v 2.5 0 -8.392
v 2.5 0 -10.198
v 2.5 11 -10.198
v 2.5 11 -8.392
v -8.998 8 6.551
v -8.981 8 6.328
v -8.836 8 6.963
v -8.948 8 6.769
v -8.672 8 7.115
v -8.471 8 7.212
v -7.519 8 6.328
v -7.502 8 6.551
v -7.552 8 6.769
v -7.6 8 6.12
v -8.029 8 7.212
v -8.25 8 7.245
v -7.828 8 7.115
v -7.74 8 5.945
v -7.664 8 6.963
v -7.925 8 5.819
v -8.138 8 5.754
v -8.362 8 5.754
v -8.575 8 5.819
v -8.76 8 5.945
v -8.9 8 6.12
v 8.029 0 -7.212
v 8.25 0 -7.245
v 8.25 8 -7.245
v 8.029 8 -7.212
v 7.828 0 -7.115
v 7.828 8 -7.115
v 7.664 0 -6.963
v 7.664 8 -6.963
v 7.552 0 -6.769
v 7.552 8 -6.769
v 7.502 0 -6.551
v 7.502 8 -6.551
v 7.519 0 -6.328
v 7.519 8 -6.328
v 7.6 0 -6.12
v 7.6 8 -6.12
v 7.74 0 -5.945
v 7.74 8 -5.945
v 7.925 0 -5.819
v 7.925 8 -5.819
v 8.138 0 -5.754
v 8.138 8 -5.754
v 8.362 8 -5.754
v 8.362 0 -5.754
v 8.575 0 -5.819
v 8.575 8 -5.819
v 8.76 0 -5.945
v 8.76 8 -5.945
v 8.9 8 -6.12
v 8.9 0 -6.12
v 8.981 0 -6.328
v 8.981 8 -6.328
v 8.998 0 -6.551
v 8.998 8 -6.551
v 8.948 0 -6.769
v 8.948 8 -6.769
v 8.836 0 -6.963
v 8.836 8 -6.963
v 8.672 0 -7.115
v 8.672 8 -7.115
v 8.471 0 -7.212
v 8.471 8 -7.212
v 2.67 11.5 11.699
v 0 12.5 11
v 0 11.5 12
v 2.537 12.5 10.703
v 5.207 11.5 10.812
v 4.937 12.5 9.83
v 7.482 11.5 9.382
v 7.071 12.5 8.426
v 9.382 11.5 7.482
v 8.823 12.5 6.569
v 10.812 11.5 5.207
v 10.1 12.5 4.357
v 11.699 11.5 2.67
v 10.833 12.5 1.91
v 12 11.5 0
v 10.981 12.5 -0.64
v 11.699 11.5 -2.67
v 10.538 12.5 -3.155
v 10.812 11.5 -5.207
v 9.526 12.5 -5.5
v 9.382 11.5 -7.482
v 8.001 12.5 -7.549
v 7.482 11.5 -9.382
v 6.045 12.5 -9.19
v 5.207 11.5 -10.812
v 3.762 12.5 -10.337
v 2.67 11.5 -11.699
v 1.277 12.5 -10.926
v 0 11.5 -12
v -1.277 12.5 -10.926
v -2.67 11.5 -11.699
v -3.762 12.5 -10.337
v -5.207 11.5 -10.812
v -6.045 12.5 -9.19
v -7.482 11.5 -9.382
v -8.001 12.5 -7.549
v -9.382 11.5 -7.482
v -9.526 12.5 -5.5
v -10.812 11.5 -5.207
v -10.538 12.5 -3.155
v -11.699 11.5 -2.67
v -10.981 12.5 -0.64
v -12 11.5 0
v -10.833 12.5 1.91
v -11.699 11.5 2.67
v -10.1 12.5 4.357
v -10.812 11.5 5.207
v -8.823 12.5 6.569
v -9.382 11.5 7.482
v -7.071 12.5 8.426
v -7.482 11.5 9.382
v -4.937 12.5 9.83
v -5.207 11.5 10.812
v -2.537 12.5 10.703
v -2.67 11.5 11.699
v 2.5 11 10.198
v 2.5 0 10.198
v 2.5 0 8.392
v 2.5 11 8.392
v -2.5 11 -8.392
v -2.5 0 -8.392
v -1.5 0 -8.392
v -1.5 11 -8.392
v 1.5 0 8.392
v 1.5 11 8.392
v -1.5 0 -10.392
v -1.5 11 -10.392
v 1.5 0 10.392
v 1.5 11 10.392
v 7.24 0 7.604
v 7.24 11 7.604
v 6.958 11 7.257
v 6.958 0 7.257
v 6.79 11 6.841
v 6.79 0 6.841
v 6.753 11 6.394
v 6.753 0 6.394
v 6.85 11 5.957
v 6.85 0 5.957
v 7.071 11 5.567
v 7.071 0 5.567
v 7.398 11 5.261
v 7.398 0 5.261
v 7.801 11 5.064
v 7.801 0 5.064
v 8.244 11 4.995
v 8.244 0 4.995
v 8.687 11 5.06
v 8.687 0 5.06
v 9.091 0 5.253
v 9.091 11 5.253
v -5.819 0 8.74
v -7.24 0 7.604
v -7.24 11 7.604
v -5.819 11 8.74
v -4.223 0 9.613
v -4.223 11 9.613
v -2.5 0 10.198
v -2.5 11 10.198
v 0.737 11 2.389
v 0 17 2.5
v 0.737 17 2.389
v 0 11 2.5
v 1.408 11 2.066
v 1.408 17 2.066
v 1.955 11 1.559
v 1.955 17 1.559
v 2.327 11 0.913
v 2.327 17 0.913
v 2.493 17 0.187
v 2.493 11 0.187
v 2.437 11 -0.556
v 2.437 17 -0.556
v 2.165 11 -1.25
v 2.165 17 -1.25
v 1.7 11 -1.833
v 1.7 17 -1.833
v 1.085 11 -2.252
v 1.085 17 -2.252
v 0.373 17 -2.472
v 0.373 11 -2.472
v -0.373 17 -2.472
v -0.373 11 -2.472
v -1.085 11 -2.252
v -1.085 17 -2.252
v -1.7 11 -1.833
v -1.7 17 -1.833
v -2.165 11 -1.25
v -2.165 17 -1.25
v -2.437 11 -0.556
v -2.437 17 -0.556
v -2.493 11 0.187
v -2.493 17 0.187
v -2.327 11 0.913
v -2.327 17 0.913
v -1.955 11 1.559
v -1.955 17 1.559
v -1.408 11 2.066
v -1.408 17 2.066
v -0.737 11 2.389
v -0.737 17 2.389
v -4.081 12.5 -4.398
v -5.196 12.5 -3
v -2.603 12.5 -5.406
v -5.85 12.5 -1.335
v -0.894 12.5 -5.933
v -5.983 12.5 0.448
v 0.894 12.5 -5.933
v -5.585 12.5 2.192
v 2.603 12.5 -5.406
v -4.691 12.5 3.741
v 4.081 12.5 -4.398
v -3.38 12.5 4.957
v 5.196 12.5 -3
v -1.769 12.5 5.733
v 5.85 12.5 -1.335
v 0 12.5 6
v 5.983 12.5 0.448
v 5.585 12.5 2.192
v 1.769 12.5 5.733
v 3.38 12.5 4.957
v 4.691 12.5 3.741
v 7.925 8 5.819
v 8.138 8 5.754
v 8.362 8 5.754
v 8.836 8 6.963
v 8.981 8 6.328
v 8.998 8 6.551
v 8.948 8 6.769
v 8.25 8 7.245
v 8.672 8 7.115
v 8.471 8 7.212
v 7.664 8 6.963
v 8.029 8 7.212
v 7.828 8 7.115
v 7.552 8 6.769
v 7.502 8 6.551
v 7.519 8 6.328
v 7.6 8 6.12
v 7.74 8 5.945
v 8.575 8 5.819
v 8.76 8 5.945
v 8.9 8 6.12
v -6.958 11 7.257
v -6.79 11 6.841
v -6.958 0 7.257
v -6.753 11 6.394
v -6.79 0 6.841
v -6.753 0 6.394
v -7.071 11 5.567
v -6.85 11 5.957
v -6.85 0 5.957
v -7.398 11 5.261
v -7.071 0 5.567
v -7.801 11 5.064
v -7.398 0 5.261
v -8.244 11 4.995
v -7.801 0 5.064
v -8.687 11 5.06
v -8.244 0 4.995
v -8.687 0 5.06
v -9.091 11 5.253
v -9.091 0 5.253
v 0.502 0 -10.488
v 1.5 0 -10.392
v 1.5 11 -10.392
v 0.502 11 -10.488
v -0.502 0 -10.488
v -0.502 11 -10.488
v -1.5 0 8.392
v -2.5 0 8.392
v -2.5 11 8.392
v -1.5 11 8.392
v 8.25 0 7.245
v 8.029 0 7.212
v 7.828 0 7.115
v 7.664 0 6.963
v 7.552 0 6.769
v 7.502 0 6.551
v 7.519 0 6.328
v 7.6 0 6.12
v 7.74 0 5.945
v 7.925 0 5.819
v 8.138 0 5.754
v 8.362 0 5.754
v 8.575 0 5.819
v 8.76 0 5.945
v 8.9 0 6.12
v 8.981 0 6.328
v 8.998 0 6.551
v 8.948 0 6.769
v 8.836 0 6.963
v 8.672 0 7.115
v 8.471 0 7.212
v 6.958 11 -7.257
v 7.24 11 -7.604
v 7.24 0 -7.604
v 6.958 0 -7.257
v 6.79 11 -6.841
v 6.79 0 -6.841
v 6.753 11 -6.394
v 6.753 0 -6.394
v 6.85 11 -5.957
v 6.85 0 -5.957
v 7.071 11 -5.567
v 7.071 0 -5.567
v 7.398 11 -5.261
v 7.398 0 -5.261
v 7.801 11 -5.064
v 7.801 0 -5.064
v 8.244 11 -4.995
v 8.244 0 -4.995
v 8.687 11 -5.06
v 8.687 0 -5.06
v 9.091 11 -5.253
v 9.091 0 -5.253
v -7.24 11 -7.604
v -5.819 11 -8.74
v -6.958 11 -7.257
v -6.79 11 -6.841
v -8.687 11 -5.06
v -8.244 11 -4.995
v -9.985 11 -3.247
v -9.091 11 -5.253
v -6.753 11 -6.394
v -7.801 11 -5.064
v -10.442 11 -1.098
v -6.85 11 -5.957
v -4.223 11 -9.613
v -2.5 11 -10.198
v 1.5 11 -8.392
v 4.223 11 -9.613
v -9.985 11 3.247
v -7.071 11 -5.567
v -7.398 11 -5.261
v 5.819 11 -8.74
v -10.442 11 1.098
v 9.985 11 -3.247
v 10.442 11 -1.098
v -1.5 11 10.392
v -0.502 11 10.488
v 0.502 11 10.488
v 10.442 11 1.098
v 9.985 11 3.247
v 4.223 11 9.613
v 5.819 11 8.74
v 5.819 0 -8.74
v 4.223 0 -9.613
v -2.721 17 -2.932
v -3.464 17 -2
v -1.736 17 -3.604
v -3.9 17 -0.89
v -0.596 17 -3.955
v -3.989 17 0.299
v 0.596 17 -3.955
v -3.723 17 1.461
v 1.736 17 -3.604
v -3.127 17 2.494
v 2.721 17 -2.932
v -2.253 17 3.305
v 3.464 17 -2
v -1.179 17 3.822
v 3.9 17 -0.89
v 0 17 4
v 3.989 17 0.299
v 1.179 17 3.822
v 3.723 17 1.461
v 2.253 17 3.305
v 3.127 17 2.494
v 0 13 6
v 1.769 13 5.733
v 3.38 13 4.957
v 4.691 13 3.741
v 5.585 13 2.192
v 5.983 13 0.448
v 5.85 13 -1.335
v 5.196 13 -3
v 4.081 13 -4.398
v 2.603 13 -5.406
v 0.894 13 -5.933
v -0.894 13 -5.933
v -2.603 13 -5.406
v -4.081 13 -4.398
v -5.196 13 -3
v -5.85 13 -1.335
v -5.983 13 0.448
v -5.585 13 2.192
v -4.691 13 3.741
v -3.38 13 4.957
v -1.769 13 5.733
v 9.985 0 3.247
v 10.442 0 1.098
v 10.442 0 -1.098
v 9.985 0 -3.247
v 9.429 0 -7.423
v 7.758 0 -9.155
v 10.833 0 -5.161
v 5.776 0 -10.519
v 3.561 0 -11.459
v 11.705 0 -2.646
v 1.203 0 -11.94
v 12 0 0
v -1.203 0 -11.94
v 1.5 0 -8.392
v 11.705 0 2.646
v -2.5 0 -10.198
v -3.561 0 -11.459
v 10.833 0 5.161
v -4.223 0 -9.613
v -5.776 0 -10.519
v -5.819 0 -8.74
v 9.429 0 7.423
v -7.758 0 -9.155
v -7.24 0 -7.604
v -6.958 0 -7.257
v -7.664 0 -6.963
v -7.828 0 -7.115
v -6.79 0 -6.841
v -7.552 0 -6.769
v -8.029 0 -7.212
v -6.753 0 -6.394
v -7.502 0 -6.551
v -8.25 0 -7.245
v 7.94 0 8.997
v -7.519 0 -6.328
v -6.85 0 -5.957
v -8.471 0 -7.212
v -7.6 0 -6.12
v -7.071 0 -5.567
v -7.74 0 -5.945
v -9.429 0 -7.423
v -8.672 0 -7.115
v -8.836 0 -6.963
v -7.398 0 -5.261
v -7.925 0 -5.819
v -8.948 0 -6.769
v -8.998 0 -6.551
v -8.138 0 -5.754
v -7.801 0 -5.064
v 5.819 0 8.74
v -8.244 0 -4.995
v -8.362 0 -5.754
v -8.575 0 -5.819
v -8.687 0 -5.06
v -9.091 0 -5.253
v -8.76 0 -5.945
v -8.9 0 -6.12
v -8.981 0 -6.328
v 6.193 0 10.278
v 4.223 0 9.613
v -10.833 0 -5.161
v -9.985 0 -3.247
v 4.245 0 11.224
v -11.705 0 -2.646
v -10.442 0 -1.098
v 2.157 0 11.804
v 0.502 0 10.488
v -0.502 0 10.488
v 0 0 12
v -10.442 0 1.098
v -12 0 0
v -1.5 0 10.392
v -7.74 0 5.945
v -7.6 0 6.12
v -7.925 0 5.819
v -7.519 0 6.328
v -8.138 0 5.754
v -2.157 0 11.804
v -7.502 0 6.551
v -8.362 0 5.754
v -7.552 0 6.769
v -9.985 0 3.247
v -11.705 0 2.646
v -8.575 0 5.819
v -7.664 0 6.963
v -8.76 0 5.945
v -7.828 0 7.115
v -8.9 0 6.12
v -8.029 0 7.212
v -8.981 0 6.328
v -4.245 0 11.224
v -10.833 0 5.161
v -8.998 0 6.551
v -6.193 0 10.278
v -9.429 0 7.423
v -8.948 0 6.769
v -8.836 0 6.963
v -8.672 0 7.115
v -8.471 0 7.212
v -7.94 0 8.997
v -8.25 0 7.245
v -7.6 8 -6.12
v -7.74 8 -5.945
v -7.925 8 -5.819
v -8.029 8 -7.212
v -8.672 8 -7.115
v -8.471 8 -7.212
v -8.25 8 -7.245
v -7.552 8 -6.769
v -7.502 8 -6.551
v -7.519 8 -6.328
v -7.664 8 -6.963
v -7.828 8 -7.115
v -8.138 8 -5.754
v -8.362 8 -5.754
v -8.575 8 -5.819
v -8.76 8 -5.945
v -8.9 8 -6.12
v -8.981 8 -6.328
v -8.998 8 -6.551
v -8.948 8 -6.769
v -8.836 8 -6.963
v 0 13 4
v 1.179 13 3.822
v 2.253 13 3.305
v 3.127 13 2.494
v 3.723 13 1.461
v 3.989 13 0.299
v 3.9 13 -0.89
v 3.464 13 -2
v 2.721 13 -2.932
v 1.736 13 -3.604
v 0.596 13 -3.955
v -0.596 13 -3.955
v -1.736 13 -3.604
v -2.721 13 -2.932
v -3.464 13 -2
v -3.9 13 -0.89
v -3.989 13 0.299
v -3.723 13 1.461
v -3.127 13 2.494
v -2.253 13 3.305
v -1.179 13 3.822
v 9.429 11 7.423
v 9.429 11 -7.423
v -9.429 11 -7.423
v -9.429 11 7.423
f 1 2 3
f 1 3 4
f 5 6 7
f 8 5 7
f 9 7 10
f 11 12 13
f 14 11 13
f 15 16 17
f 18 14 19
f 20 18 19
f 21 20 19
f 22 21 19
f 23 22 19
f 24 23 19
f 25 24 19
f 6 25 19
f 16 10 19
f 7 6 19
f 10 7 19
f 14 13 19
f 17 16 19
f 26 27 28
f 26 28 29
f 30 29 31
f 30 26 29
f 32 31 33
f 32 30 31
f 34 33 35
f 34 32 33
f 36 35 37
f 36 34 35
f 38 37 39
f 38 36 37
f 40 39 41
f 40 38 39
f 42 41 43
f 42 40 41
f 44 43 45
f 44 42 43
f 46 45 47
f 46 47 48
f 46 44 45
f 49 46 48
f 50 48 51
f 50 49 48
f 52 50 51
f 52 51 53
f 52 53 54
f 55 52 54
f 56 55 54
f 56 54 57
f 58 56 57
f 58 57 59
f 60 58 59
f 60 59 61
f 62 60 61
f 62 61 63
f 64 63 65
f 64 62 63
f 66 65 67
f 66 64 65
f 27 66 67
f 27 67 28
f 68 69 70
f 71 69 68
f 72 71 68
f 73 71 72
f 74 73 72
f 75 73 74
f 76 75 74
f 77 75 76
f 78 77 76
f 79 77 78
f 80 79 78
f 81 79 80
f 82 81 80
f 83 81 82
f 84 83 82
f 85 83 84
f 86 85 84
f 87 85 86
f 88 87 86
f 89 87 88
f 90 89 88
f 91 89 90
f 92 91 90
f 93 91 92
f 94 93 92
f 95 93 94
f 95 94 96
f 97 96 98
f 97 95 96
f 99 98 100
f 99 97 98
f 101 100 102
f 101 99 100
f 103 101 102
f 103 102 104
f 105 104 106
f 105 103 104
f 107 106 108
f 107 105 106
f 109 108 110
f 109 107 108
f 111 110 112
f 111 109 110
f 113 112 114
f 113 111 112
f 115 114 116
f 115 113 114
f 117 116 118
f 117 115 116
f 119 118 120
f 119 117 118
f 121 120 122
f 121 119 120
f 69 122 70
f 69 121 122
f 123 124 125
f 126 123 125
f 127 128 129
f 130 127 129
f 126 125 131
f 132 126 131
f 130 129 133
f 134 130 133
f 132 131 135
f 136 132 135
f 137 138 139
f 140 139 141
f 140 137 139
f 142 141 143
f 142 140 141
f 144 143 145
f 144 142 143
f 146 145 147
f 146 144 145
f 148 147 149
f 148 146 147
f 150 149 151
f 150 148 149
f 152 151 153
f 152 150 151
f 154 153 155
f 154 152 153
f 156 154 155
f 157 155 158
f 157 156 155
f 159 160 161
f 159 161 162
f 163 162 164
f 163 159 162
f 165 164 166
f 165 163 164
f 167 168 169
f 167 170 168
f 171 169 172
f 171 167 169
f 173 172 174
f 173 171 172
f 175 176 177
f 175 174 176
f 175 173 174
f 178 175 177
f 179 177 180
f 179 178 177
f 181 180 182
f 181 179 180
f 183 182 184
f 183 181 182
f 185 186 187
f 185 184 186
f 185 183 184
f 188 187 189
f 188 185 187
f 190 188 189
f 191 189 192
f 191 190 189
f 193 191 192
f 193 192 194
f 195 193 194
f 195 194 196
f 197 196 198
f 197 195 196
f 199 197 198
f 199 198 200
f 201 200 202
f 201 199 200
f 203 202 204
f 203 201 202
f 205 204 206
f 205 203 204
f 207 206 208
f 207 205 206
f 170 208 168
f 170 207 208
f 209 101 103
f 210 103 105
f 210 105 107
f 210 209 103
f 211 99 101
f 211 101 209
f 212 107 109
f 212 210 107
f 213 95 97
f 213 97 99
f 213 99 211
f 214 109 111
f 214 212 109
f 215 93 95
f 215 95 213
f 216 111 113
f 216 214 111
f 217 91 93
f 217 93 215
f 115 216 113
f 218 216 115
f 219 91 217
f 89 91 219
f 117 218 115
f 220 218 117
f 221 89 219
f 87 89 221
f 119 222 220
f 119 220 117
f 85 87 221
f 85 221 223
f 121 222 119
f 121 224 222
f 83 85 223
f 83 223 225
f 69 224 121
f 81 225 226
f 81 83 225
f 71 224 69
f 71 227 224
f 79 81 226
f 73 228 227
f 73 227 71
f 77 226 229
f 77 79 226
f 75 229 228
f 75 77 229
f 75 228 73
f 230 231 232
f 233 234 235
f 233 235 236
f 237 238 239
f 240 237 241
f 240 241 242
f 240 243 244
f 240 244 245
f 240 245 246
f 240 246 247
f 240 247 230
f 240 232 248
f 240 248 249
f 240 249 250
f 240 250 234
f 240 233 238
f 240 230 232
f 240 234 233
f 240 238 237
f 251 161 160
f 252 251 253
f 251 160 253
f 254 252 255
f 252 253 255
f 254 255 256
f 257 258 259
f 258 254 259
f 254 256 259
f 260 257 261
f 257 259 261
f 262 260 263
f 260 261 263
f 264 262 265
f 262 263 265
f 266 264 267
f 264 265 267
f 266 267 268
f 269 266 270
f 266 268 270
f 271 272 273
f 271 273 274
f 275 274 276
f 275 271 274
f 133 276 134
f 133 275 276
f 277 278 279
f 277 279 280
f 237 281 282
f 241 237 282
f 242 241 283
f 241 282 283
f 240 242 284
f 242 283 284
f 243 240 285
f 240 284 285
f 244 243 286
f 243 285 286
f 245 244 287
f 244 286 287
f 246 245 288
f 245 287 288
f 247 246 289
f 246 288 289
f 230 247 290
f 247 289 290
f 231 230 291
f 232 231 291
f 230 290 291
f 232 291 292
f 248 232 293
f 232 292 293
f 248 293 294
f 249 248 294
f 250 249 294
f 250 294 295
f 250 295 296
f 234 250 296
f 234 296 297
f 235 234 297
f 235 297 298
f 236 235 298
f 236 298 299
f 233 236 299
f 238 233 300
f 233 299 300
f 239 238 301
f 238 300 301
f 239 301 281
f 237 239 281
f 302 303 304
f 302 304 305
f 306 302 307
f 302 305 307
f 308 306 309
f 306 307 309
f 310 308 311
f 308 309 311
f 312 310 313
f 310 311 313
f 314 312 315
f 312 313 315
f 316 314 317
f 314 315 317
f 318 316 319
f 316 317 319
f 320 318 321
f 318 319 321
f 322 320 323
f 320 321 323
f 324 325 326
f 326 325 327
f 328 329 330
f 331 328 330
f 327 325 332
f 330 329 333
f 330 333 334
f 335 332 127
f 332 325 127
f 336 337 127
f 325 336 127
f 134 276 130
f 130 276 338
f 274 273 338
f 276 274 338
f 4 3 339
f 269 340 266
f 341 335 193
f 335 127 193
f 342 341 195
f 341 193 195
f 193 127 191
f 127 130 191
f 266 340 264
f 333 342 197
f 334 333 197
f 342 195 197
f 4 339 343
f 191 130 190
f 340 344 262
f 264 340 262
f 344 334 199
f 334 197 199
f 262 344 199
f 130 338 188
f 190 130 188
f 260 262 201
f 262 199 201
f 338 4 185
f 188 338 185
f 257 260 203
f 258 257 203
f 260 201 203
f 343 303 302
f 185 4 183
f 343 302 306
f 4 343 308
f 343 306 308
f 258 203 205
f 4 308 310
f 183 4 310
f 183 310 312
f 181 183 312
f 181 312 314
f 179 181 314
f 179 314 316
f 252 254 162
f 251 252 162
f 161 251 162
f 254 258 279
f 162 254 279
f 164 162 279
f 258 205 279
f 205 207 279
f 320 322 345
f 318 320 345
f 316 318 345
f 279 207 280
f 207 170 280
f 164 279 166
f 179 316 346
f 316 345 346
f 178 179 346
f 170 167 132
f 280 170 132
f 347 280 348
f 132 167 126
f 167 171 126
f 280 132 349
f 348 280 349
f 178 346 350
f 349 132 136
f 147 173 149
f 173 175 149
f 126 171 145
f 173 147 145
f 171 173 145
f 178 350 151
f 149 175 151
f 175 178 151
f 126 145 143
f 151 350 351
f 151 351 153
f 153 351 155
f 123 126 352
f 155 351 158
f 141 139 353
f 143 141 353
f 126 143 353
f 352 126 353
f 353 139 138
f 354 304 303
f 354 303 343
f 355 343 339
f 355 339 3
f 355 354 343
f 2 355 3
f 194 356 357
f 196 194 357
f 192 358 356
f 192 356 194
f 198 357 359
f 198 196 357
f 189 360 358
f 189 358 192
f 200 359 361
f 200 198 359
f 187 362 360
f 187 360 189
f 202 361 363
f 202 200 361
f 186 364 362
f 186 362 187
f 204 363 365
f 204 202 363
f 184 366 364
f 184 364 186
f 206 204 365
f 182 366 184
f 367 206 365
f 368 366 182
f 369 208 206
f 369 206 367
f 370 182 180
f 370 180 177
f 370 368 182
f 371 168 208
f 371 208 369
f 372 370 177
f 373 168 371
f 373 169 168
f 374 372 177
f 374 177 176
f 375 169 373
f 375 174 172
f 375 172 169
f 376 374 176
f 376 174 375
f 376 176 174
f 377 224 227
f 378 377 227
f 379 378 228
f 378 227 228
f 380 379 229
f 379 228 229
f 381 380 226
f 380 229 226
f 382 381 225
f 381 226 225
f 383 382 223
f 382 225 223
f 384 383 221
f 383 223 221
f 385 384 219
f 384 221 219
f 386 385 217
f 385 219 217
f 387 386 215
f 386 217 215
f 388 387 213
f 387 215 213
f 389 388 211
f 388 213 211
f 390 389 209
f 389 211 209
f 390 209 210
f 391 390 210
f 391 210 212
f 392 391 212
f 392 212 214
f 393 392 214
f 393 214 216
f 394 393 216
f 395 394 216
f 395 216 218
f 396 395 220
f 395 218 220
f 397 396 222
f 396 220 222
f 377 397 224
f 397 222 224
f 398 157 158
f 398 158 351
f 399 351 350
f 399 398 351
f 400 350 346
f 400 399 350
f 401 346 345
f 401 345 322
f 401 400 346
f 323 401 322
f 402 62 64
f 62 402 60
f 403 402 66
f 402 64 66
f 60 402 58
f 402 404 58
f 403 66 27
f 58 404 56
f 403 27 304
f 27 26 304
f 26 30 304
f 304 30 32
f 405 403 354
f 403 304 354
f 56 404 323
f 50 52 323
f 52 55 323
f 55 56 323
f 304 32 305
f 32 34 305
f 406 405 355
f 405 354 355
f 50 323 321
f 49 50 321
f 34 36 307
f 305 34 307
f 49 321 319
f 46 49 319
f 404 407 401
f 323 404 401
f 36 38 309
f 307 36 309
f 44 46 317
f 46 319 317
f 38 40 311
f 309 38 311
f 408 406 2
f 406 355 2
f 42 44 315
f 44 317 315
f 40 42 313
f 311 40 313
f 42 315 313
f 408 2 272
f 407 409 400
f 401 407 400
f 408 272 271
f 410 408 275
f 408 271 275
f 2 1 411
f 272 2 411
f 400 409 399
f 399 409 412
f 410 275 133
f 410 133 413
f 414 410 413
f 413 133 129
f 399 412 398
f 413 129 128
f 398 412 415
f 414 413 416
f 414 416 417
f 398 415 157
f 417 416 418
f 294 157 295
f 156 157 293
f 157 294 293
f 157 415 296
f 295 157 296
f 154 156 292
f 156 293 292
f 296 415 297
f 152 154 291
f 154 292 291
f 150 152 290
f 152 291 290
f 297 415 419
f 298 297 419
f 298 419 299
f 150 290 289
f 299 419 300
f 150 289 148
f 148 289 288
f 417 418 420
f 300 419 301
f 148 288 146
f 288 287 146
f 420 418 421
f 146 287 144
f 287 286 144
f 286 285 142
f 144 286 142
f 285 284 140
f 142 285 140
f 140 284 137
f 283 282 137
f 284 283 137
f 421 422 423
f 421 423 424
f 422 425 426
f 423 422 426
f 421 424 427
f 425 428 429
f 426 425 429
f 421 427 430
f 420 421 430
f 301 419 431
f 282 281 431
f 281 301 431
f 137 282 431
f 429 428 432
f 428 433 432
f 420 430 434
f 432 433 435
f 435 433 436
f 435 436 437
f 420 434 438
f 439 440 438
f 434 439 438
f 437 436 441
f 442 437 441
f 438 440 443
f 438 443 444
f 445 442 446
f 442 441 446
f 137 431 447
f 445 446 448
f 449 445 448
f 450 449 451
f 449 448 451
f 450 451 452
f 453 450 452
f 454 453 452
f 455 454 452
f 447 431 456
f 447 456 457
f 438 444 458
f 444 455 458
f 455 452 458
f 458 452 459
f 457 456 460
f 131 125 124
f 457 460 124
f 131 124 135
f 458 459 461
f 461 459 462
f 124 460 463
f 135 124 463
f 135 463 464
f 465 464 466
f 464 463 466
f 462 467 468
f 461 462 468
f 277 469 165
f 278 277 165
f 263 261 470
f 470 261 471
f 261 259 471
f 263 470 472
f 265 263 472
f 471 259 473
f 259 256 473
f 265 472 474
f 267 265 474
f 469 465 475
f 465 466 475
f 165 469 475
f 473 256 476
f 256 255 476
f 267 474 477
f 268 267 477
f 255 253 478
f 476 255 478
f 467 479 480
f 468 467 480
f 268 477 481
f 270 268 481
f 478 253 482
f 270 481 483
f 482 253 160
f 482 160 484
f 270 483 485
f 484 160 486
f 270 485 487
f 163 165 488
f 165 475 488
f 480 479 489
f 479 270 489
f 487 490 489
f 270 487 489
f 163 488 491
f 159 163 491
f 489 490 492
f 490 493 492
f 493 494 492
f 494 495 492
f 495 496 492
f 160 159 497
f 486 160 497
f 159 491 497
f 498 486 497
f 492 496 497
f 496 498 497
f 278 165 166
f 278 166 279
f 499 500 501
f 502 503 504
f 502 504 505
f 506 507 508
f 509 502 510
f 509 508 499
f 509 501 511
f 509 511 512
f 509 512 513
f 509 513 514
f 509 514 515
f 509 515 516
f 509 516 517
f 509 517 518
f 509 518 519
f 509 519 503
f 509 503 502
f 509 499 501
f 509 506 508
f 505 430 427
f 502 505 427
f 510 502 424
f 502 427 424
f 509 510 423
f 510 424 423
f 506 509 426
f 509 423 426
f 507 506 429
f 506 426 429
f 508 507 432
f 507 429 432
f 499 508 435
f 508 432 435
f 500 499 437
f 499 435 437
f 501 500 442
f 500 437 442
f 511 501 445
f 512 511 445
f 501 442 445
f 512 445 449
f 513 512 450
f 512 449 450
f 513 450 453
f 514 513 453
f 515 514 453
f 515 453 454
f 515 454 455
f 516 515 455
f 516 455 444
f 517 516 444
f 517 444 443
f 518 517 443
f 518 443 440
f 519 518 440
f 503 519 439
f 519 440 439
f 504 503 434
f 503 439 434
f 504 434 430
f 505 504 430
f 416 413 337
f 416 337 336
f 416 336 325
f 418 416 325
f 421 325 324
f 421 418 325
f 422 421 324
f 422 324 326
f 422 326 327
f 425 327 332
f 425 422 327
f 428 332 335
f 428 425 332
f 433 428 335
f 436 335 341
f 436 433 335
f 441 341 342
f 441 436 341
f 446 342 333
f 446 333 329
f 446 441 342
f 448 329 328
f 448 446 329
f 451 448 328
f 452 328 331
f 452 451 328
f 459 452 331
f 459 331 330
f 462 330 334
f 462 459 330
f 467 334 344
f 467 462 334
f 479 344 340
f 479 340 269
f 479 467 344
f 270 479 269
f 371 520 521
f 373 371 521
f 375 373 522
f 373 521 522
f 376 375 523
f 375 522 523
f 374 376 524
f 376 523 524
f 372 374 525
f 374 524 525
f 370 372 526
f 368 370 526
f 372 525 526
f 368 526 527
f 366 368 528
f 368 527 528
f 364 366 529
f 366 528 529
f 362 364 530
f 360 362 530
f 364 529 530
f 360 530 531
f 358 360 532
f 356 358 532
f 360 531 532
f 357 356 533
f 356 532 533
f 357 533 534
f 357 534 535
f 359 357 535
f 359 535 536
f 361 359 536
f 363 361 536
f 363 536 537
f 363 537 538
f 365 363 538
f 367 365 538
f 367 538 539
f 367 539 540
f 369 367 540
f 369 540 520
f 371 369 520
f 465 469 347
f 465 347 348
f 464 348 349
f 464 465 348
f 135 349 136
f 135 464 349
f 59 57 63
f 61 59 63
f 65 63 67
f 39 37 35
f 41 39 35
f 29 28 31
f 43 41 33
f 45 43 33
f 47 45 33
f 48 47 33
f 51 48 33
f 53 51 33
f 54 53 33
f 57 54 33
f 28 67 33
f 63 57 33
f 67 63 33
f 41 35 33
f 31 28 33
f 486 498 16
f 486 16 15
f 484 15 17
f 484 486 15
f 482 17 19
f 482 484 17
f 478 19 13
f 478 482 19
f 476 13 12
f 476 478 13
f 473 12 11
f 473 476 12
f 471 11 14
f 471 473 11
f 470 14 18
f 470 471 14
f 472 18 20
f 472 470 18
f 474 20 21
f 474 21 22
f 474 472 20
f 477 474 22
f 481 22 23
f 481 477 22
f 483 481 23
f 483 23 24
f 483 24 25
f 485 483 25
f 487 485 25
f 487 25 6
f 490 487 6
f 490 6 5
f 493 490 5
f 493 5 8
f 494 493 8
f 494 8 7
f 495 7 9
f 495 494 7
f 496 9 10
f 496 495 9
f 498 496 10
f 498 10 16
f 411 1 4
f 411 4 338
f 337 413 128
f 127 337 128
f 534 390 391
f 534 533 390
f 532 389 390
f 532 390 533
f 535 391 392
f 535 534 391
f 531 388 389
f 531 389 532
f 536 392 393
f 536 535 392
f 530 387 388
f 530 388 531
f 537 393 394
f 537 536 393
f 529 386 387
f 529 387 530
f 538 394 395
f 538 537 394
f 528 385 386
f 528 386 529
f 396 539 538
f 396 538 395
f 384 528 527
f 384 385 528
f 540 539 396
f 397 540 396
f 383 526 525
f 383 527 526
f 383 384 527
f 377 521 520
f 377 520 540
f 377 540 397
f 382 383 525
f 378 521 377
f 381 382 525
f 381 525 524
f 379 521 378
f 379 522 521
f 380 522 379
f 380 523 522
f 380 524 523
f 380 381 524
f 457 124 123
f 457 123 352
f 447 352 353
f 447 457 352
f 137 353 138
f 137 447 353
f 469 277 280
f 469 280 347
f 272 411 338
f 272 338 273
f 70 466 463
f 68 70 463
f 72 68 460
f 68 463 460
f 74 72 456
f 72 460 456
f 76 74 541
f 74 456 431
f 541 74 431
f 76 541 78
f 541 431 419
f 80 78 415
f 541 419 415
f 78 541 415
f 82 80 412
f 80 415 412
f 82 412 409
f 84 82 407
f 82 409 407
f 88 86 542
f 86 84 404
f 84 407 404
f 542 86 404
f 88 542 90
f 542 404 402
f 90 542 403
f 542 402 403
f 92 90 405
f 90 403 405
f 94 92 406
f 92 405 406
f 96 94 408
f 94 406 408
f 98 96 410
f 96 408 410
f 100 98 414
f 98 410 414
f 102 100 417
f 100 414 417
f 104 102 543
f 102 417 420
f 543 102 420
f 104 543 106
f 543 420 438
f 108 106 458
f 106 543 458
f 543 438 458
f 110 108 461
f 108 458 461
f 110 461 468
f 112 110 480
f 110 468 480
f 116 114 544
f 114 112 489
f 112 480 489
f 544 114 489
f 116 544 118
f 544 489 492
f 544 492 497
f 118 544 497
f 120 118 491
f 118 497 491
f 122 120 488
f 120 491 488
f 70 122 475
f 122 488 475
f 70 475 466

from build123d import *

# Parameters (mm, degrees)
SKETCH1_R               = 12
BOSS_EXTRUDE1_DEPTH     = 12.5
SKETCH2_R               = 4
BOSS_EXTRUDE2_DEPTH     = 4.5
SHELL1_T                = -1.5
CHAMFER2_SIZE           = 1
SKETCH3_R               = 6
SKETCH3_R_2             = 4
BOSS_EXTRUDE3_DEPTH     = 0.5
BOSS_EXTRUDE4_DEPTH     = 11
MIRROR2_COPY_1_DEPTH    = 11
SKETCH5_R               = 1.5
BOSS_EXTRUDE5_DEPTH     = 11
MIRROR4_COPY_1_SKETCH_R = 1.5
MIRROR4_COPY_1_DEPTH    = 11
SKETCH6_R               = 0.75
CUT_EXTRUDE1_DEPTH      = 8
MIRROR6_COPY_1_SKETCH_R = 0.75
MIRROR6_COPY_1_DEPTH    = 8


with BuildPart() as part:
    # Sketch1 → Boss-Extrude1 (new body)
    with BuildSketch(Plane(origin=(0, 0, 0), x_dir=(1, 0, 0), z_dir=(0, 1, 0))):
        with Locations(Location((0, 0, 0), (0, 0, 270))):
            Circle(SKETCH1_R)
    extrude(amount=BOSS_EXTRUDE1_DEPTH)

    # Sketch2 → Boss-Extrude2 (add)
    with BuildSketch(Plane(origin=(0, 12.5, 0), x_dir=(1, 0, 0), z_dir=(0, 1, 0))):
        with Locations(Location((0, 0, 0), (0, 0, 270))):
            Circle(SKETCH2_R)
    extrude(amount=BOSS_EXTRUDE2_DEPTH)

    # Shell1
    shell1_openings = [part.faces().sort_by_distance(p)[0] for p in [
        (0, 0, 0),
        (0, 17, 0),
    ]]
    offset(amount=SHELL1_T, openings=shell1_openings, kind=Kind.INTERSECTION)

    # Chamfer2
    chamfer2_edges = [part.edges().sort_by_distance(p)[0] for p in [
        (0, 12.5, -12),
    ]]
    chamfer(chamfer2_edges, length=CHAMFER2_SIZE)

    # Sketch3 → Boss-Extrude3 (add)
    with BuildSketch(Plane(origin=(0, 12.5, 0), x_dir=(1, 0, 0), z_dir=(0, 1, 0))):
        with Locations(Location((0, 0, 0), (0, 0, 270))):
            Circle(SKETCH3_R)
        with Locations(Location((0, 0, 0), (0, 0, 270))):
            Circle(SKETCH3_R_2, mode=Mode.SUBTRACT)
    extrude(amount=BOSS_EXTRUDE3_DEPTH)

    # Sketch4 → Boss-Extrude4 (add)
    with BuildSketch(Plane(origin=(0, 0, 0), x_dir=(1, 0, 0), z_dir=(0, 1, 0))):
        with BuildLine():
            Line((-2.5, -10.198039027), (-2.5, -8.392304845))
            Line((-2.5, -8.392304845), (-1.5, -8.392304845))
            Line((-1.5, -8.392304845), (-1.5, -10.392304845))
            ThreePointArc((-1.5, -10.392304845), (-2.002357311, -10.307306399), (-2.5, -10.198039027))
        make_face()
    boss_extrude4 = extrude(amount=BOSS_EXTRUDE4_DEPTH)

    # Mirror1: Boss-Extrude4 across plane
    add(boss_extrude4.mirror(Plane(origin=(0, 0, 0), x_dir=(0, 0, 1), z_dir=(1, 0, 0))))

    # Mirror2: Boss-Extrude4 across plane
    add(boss_extrude4.mirror(Plane.XY))

    # Mirror2 copy 1 sketch → Mirror2 copy 1 (add)
    with BuildSketch(Plane(origin=(0, 0, 0), x_dir=(-1, 0, 0), z_dir=(0, 1, 0))):
        with BuildLine():
            Line((-2.5, -10.198039027), (-2.5, -8.392304845))
            Line((-2.5, -8.392304845), (-1.5, -8.392304845))
            Line((-1.5, -8.392304845), (-1.5, -10.392304845))
            ThreePointArc((-1.5, -10.392304845), (-2.002357311, -10.307306399), (-2.5, -10.198039027))
        make_face()
    extrude(amount=MIRROR2_COPY_1_DEPTH)

    # Sketch5 → Boss-Extrude5 (add)
    with BuildSketch(Plane(origin=(0, 0, 0), x_dir=(1, 0, 0), z_dir=(0, 1, 0))):
        with Locations((-8.25, -6.495190528)):
            Circle(SKETCH5_R)
    boss_extrude5 = extrude(amount=BOSS_EXTRUDE5_DEPTH)

    # Mirror3: Boss-Extrude5 across plane
    add(boss_extrude5.mirror(Plane(origin=(0, 0, 0), x_dir=(0, 0, 1), z_dir=(1, 0, 0))))

    # Mirror4: Boss-Extrude5 across plane
    add(boss_extrude5.mirror(Plane.XY))

    # Mirror4 copy 1 sketch → Mirror4 copy 1 (add)
    with BuildSketch(Plane(origin=(0, 0, 0), x_dir=(-1, 0, 0), z_dir=(0, 1, 0))):
        with Locations((-8.25, -6.495190528)):
            Circle(MIRROR4_COPY_1_SKETCH_R)
    extrude(amount=MIRROR4_COPY_1_DEPTH)

    # Sketch6 → Cut-Extrude1 (cut)
    with BuildSketch(Plane(origin=(0, 0, 0), x_dir=(1, 0, 0), z_dir=(0, 1, 0))):
        with Locations(Location((-8.25, -6.495190528, 0), (0, 0, 270))):
            Circle(SKETCH6_R)
    cut_extrude1 = extrude(amount=CUT_EXTRUDE1_DEPTH, mode=Mode.SUBTRACT)

    # Mirror5: Cut-Extrude1 across plane
    add(cut_extrude1.mirror(Plane(origin=(0, 0, 0), x_dir=(0, 0, 1), z_dir=(1, 0, 0))), mode=Mode.SUBTRACT)

    # Mirror6: Cut-Extrude1 across plane
    add(cut_extrude1.mirror(Plane.XY), mode=Mode.SUBTRACT)

    # Mirror6 copy 1 sketch → Mirror6 copy 1 (cut)
    with BuildSketch(Plane(origin=(0, 0, 0), x_dir=(-1, 0, 0), z_dir=(0, 1, 0))):
        with Locations(Location((-8.25, -6.495190528, 0), (0, 0, 270))):
            Circle(MIRROR6_COPY_1_SKETCH_R)
    extrude(amount=MIRROR6_COPY_1_DEPTH, mode=Mode.SUBTRACT)


solid = part.part
